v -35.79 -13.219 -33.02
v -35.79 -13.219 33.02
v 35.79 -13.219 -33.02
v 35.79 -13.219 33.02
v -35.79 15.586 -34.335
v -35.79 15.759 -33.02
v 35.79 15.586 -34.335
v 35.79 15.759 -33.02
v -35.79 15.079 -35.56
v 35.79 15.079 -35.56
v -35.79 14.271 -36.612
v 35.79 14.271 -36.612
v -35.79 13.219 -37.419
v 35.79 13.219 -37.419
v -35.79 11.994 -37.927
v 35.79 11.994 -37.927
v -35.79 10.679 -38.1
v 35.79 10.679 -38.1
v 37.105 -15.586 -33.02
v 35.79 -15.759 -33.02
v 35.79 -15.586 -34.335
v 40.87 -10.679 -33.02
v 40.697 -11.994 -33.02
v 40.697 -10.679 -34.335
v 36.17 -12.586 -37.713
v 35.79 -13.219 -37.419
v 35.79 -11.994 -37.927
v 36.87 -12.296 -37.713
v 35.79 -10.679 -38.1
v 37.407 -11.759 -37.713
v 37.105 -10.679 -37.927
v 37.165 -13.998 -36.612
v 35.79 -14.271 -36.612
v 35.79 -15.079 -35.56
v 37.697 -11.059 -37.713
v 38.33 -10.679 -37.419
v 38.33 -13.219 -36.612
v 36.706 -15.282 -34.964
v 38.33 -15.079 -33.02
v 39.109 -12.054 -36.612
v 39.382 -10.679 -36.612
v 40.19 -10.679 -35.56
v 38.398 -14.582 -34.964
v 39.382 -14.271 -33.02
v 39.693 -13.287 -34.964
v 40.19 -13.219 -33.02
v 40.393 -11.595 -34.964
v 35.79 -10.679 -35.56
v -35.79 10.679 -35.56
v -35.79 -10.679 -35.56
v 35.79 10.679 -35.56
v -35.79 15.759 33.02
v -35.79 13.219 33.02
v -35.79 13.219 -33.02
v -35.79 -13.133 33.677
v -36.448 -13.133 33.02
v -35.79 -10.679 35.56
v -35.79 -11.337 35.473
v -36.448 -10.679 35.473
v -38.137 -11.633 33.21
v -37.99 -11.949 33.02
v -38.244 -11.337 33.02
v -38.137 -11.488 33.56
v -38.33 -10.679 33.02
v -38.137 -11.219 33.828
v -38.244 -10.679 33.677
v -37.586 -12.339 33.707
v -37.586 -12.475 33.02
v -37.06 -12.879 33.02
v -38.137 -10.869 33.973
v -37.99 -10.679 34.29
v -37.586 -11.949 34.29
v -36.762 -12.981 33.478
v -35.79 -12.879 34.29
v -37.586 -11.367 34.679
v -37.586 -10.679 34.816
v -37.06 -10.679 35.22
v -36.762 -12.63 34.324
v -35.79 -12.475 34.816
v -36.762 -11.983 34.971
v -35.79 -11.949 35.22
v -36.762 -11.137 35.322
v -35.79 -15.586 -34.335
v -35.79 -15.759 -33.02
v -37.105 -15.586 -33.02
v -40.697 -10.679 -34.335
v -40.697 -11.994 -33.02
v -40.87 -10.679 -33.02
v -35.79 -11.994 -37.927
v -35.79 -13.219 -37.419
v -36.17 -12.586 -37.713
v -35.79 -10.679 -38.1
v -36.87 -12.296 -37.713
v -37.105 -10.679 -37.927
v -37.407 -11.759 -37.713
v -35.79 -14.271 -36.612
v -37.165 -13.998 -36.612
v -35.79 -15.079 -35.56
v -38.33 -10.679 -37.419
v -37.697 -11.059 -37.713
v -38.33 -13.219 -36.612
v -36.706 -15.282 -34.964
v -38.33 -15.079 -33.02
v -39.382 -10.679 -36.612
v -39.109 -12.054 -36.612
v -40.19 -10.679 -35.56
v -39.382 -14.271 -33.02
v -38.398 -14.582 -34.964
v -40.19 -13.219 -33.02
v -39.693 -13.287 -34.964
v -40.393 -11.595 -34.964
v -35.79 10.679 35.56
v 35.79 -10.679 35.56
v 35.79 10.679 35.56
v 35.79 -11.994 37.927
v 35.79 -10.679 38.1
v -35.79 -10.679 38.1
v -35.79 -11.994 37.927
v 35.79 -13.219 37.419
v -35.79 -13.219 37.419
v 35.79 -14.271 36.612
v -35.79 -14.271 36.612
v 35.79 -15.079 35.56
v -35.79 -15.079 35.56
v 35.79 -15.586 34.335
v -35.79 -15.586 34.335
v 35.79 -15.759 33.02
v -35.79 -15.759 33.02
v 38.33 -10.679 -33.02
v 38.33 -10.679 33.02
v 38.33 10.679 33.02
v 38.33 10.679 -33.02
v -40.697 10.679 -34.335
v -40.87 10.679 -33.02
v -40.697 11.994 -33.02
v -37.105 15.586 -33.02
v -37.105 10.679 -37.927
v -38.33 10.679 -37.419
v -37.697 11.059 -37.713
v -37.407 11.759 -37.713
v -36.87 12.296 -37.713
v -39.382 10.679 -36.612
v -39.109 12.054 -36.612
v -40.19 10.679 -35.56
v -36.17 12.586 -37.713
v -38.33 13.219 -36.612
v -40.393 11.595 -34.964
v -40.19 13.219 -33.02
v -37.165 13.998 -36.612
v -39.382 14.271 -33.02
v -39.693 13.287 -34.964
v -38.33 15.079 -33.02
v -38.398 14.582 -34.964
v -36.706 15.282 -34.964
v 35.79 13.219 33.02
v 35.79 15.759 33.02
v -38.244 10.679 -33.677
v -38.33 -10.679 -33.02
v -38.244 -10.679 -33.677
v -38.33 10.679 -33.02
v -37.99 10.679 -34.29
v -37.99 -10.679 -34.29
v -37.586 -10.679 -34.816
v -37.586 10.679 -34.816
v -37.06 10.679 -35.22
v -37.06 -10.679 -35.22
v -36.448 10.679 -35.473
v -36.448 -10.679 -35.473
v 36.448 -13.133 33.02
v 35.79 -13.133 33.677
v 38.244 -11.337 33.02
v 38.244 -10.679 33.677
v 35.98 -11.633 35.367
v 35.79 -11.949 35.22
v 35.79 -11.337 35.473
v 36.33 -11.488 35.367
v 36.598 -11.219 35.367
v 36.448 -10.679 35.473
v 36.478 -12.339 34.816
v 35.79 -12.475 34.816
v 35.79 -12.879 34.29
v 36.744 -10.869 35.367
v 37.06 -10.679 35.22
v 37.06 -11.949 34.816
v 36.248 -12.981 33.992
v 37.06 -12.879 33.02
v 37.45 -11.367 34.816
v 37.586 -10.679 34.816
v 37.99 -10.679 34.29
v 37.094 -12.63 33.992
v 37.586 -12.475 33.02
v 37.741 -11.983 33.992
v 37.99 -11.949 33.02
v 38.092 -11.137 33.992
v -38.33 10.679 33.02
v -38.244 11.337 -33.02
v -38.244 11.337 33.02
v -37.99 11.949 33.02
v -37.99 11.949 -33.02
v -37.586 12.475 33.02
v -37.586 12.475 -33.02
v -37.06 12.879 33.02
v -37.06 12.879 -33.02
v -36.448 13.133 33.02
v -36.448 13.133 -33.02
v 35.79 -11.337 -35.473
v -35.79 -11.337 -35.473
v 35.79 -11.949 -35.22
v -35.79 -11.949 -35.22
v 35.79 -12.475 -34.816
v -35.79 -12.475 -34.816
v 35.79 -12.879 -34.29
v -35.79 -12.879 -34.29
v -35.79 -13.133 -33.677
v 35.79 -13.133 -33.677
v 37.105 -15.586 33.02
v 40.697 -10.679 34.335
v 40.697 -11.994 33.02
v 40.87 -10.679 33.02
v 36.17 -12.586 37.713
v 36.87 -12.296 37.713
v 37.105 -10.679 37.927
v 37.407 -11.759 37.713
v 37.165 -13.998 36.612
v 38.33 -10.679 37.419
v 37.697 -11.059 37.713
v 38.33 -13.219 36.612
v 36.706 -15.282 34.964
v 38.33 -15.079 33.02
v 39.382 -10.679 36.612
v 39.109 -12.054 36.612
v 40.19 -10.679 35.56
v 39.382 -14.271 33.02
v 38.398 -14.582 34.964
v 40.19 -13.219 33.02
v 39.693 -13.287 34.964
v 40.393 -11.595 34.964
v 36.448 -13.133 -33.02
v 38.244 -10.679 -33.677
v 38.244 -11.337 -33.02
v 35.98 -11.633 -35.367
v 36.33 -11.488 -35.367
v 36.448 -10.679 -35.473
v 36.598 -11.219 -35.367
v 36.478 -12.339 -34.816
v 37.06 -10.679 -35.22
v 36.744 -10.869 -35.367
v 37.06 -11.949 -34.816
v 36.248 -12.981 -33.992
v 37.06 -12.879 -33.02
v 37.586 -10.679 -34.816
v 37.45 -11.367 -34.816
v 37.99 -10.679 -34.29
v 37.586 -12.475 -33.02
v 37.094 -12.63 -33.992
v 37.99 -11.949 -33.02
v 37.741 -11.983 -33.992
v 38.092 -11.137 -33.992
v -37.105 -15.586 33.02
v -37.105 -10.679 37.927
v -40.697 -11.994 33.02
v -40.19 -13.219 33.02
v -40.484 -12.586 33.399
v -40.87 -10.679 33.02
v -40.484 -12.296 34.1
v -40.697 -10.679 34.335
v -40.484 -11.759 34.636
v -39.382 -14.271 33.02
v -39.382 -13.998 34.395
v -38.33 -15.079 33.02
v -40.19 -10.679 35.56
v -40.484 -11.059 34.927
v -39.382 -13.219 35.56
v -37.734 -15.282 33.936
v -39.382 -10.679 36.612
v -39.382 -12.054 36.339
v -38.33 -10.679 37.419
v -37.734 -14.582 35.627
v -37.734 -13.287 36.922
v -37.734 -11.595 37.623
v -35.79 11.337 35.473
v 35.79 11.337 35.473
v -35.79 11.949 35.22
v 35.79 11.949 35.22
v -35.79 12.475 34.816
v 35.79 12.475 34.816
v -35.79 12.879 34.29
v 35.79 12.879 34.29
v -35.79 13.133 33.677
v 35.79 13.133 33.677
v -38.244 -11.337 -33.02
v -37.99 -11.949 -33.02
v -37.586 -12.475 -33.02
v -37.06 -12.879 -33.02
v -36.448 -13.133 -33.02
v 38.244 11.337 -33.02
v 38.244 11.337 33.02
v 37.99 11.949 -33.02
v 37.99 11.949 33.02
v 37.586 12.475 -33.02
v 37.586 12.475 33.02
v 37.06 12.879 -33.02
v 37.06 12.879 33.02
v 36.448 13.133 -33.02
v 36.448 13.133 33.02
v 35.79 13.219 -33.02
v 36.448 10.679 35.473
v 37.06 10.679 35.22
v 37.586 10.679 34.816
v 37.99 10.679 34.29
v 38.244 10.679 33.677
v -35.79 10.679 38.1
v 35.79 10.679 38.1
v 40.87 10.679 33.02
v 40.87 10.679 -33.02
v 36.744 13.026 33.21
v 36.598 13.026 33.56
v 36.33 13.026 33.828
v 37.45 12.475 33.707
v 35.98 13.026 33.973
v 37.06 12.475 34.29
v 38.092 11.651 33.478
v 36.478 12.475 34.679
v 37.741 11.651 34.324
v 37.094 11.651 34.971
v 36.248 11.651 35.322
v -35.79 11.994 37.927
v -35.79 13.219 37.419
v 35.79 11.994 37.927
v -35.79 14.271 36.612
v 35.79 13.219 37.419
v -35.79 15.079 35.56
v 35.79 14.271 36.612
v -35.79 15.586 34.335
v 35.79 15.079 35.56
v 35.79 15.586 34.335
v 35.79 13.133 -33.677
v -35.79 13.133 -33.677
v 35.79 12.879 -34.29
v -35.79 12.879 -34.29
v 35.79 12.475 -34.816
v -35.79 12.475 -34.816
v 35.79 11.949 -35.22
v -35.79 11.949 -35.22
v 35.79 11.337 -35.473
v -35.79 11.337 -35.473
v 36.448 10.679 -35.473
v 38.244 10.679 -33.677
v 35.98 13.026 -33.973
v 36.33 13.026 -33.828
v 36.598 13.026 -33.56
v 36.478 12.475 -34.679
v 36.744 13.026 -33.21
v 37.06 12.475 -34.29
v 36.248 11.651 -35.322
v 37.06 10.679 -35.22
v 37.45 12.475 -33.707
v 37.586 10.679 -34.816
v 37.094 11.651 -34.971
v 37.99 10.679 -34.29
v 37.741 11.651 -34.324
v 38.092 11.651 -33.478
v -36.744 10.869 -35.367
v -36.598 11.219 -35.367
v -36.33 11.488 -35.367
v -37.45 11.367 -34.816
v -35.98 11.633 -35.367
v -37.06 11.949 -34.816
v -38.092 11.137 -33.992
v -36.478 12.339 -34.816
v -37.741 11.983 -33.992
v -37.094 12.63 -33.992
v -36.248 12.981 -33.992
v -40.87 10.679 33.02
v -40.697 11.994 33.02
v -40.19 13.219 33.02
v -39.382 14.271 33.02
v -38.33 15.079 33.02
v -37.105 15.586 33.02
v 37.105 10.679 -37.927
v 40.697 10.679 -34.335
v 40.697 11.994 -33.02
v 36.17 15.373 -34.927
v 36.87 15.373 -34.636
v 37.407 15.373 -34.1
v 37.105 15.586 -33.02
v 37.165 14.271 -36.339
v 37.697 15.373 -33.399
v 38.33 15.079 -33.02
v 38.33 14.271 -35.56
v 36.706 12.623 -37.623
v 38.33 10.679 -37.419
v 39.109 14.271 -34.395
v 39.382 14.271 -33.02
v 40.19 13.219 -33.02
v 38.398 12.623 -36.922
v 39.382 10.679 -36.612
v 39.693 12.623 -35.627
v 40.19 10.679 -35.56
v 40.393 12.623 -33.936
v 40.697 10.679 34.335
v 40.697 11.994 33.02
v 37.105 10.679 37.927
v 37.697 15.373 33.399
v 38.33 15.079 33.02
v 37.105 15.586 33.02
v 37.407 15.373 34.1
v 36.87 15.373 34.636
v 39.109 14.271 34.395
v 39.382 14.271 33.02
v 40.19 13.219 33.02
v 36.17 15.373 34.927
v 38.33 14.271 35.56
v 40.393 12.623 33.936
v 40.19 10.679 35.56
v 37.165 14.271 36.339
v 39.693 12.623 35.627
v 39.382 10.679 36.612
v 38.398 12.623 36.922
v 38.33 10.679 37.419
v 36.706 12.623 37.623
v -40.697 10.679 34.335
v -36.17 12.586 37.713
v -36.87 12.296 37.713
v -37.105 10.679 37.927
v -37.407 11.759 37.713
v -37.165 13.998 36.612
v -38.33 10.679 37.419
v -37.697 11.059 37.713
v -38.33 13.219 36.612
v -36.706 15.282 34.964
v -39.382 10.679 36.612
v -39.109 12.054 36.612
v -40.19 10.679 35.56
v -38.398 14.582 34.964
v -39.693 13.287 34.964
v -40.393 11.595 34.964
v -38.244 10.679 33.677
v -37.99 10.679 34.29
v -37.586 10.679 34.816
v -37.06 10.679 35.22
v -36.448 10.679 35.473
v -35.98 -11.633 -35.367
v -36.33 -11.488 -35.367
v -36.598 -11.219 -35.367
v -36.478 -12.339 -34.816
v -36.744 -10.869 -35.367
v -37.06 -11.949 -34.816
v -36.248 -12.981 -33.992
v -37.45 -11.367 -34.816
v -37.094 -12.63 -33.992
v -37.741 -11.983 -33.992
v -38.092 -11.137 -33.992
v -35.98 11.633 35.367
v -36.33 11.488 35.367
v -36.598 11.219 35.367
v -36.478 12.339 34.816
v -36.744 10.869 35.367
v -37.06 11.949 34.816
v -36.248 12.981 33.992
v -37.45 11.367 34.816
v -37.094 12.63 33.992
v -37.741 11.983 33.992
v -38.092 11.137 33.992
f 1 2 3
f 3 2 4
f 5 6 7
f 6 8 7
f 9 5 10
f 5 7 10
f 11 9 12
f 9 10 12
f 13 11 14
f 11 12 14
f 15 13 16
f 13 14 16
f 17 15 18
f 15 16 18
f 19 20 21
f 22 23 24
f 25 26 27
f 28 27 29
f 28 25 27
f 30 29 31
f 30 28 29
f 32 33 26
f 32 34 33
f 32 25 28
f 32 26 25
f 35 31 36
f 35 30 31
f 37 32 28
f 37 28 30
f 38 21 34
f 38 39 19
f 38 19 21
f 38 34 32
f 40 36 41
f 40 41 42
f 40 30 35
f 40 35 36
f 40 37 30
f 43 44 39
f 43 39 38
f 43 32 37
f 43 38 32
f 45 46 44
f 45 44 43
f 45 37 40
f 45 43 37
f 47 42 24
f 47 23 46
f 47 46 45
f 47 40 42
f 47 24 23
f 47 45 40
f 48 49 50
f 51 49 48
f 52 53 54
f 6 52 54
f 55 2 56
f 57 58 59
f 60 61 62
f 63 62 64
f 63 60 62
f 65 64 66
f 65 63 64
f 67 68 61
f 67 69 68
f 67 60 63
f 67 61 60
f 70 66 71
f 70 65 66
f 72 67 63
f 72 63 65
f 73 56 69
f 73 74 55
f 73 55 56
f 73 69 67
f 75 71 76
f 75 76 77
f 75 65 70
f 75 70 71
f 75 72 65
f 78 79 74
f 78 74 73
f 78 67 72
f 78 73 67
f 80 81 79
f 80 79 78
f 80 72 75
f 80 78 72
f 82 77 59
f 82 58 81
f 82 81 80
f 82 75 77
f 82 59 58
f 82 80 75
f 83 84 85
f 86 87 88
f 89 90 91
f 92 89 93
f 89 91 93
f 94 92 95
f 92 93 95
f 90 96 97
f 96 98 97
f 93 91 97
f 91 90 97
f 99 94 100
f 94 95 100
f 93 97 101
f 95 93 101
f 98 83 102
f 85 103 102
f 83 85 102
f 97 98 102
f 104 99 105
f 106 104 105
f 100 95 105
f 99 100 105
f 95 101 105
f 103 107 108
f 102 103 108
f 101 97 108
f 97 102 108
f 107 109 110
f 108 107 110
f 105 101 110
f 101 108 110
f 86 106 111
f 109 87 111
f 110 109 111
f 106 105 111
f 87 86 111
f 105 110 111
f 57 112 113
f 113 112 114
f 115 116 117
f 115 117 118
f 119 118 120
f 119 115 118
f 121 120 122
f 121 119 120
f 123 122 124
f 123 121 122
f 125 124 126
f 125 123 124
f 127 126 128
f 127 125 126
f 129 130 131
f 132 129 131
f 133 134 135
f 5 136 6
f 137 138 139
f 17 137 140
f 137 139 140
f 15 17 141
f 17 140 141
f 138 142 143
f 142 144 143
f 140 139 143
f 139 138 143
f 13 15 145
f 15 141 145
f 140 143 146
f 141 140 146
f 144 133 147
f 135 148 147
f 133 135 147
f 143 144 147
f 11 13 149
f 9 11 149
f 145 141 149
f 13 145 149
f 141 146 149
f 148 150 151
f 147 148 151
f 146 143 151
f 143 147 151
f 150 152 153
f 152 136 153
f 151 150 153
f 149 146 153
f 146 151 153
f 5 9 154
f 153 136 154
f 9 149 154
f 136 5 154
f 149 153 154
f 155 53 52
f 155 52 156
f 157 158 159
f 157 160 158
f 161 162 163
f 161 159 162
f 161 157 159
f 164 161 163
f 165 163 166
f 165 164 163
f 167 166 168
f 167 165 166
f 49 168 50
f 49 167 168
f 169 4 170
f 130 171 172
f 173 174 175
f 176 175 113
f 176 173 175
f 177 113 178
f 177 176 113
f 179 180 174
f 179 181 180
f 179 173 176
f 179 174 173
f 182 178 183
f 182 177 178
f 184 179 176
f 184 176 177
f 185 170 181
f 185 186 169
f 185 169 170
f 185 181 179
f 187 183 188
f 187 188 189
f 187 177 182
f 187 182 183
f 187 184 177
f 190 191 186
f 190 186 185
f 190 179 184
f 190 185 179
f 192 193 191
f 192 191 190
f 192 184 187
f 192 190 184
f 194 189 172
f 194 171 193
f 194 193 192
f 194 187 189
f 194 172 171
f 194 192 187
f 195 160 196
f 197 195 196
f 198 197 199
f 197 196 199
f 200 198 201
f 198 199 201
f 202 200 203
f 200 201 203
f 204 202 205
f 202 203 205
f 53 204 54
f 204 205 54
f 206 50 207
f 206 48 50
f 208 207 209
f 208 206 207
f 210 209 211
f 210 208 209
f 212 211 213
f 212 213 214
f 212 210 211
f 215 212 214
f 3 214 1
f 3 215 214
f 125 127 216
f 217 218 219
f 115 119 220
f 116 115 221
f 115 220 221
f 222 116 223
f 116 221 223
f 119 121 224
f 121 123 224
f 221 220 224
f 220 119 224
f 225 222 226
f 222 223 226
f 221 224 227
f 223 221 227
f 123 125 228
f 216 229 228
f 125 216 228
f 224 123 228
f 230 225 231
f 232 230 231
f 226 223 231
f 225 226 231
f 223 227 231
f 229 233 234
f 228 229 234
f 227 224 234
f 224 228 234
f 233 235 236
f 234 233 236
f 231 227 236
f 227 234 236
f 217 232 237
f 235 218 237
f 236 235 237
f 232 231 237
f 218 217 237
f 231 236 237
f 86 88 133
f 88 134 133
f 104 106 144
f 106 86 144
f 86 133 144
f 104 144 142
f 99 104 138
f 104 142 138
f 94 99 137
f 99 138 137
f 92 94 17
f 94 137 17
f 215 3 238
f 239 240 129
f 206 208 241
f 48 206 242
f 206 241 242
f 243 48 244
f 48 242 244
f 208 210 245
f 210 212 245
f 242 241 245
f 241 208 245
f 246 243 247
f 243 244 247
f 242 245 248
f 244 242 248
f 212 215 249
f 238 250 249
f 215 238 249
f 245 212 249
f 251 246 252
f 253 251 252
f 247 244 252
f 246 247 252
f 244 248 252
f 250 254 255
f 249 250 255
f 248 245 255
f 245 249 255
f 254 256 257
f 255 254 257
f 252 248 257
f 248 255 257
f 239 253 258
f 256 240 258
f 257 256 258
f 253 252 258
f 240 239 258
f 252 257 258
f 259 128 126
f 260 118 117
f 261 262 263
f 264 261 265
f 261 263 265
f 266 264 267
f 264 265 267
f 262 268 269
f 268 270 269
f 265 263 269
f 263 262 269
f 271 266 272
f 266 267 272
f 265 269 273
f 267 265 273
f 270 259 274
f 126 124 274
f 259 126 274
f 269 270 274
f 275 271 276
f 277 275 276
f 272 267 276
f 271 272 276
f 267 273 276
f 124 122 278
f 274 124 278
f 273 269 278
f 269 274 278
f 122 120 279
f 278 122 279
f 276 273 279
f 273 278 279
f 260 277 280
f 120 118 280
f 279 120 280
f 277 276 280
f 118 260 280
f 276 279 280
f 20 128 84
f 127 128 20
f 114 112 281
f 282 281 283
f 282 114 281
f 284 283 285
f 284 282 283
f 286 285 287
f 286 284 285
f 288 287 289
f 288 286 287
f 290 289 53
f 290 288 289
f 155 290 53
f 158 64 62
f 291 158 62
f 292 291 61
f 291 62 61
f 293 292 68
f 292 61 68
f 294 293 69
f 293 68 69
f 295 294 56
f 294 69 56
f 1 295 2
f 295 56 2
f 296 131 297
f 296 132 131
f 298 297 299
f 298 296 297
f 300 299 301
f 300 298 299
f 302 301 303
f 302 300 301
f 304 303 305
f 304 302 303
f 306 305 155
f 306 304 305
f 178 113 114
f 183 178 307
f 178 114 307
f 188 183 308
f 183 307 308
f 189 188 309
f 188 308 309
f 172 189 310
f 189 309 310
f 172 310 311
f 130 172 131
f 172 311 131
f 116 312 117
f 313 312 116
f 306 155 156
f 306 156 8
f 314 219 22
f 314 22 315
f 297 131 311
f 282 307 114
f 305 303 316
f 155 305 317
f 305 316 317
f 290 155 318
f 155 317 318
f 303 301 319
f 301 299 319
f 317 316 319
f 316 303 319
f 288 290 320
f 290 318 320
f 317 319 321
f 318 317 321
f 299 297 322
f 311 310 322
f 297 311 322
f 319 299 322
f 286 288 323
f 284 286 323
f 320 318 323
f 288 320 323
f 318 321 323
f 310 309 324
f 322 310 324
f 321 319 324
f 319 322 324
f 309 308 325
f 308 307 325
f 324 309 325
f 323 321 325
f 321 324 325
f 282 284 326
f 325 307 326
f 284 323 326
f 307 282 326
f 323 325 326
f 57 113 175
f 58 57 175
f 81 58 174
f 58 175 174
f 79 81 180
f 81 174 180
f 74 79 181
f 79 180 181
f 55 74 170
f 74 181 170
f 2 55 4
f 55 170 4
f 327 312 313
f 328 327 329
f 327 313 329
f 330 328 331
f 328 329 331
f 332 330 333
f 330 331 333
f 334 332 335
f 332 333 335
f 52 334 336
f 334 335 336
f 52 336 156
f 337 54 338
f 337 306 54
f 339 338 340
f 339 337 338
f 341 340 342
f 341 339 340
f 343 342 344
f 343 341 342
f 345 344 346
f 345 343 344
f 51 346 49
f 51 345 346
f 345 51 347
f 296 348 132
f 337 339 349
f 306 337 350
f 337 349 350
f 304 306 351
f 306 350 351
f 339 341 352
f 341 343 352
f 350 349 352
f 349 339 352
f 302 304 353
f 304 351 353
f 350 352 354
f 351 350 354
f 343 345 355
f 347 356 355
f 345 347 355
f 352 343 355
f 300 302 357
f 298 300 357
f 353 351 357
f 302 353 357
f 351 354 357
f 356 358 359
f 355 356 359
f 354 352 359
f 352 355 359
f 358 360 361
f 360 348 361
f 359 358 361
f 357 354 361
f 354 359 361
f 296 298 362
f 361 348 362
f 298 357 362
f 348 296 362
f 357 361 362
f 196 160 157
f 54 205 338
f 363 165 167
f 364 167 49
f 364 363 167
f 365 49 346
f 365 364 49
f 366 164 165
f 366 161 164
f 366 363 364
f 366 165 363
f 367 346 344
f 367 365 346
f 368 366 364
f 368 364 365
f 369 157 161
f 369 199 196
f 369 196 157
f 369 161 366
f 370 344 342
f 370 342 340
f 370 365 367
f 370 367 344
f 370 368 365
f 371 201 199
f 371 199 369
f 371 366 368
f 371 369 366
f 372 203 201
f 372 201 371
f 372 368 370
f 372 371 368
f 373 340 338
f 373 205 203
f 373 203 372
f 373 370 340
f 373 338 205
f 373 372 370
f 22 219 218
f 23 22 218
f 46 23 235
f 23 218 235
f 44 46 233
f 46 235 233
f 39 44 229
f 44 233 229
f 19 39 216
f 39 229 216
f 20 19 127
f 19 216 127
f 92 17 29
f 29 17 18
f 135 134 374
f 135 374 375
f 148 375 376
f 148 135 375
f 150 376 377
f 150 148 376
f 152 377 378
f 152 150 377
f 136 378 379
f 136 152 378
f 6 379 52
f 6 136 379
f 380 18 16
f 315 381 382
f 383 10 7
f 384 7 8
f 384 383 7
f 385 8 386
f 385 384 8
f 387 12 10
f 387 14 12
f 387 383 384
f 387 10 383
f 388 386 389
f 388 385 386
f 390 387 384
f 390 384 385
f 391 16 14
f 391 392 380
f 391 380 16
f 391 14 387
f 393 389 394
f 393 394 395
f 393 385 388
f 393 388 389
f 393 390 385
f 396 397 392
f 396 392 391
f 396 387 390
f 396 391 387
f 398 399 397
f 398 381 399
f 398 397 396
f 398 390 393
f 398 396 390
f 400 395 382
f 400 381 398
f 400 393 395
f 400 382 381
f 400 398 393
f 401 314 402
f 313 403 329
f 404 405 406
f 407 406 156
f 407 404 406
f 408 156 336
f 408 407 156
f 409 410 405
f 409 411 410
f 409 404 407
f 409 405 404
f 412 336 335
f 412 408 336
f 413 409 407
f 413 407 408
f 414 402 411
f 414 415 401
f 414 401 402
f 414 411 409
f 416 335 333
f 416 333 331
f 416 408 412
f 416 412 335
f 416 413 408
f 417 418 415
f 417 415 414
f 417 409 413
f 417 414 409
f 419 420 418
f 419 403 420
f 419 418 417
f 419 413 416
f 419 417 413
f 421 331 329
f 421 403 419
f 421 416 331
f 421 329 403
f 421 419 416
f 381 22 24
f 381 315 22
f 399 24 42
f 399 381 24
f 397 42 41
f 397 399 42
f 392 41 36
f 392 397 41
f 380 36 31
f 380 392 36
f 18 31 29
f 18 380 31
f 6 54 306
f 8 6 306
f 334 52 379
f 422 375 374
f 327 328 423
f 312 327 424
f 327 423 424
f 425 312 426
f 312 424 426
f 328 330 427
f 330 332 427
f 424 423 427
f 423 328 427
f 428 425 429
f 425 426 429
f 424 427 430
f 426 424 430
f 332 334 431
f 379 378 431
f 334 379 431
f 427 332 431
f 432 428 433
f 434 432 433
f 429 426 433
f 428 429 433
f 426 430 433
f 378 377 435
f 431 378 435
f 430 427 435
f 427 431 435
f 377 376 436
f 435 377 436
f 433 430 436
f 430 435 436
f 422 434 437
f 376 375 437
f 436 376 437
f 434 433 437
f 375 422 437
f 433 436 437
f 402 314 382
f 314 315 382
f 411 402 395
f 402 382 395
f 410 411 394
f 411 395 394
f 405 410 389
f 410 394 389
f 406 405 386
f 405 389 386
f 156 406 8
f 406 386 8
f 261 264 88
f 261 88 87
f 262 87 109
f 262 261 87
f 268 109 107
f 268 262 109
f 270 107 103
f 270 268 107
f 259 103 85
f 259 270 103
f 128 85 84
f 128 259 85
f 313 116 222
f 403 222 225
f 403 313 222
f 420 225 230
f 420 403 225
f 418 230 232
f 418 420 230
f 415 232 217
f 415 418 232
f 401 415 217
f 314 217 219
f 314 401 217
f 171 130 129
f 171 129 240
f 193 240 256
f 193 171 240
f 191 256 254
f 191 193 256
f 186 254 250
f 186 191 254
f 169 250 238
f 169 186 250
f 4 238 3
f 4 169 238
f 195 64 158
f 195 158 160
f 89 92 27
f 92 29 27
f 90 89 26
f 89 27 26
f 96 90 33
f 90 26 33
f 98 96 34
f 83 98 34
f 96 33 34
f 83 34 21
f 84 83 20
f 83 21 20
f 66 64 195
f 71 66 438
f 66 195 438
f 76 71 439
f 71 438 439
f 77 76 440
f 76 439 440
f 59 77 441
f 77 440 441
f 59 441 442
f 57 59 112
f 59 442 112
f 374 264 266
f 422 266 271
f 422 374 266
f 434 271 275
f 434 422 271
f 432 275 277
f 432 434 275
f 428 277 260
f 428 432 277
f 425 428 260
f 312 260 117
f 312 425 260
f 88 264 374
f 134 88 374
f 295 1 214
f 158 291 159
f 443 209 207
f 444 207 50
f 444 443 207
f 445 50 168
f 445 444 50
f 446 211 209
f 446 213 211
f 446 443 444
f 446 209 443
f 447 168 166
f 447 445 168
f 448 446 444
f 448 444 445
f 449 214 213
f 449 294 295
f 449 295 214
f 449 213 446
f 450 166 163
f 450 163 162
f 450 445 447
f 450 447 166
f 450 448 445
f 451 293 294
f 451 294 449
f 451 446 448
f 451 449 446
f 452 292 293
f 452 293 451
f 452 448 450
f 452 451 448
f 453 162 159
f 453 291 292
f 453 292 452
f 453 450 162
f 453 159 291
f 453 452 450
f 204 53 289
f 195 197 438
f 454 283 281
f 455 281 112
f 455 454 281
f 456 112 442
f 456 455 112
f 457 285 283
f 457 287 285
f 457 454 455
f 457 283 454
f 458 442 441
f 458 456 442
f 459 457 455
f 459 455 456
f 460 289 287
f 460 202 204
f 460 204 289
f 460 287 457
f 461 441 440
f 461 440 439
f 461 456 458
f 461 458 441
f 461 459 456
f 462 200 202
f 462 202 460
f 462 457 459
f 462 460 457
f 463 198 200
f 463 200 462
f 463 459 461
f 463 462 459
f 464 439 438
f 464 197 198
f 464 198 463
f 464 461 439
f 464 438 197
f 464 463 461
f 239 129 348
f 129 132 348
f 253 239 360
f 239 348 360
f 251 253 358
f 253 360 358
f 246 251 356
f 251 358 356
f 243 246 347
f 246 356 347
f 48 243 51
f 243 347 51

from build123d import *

# Parameters (mm, degrees)
F0_W     = 81.7405879498
F0_H     = 31.518612057
F1_DEPTH = 38.1
F2_R     = 5.08
F3_T     = -2.54


# Not quite as in the source:
# - a shell that OpenCascade refuses in one call is made with other operations: the cavity is built on its own and cut out


with BuildPart() as f1:
    # F0 (on Top) → F1 (new body, symmetric)
    with BuildSketch(Plane.XY):
        Rectangle(F0_W, F0_H)
    extrude(amount=F1_DEPTH, both=True)

    # F2
    f2_edges = [f1.edges().sort_by_distance(p)[0] for p in [
        (40.870294, -15.759306, 0),
        (0, -15.759306, 38.1),
        (-40.870294, -15.759306, 0),
        (0, -15.759306, -38.1),
        (-40.870294, 15.759306, 0),
        (-40.870294, 0, -38.1),
        (40.870294, 0, -38.1),
        (0, 15.759306, -38.1),
        (40.870294, 0, 38.1),
        (40.870294, 15.759306, 0),
        (0, 15.759306, 38.1),
        (-40.870294, 0, 38.1),
    ]]
    fillet(f2_edges, radius=F2_R)

    # F3: a shell. OpenCascade refuses it in one call, so the cavity is built on its own and cut out:
    # the body offset inwards by the wall thickness, plus a prism from it out through each open face.
    f3_core = offset(f1.part, amount=F3_T, mode=Mode.PRIVATE)
    f3_exits = [f3_core.faces().sort_by_distance(p)[0] for p in [
        (0, 13.219306, 0),
    ]]
    add(f3_core, mode=Mode.SUBTRACT)
    extrude(f3_exits, amount=-F3_T, mode=Mode.SUBTRACT)


solid = f1.part
